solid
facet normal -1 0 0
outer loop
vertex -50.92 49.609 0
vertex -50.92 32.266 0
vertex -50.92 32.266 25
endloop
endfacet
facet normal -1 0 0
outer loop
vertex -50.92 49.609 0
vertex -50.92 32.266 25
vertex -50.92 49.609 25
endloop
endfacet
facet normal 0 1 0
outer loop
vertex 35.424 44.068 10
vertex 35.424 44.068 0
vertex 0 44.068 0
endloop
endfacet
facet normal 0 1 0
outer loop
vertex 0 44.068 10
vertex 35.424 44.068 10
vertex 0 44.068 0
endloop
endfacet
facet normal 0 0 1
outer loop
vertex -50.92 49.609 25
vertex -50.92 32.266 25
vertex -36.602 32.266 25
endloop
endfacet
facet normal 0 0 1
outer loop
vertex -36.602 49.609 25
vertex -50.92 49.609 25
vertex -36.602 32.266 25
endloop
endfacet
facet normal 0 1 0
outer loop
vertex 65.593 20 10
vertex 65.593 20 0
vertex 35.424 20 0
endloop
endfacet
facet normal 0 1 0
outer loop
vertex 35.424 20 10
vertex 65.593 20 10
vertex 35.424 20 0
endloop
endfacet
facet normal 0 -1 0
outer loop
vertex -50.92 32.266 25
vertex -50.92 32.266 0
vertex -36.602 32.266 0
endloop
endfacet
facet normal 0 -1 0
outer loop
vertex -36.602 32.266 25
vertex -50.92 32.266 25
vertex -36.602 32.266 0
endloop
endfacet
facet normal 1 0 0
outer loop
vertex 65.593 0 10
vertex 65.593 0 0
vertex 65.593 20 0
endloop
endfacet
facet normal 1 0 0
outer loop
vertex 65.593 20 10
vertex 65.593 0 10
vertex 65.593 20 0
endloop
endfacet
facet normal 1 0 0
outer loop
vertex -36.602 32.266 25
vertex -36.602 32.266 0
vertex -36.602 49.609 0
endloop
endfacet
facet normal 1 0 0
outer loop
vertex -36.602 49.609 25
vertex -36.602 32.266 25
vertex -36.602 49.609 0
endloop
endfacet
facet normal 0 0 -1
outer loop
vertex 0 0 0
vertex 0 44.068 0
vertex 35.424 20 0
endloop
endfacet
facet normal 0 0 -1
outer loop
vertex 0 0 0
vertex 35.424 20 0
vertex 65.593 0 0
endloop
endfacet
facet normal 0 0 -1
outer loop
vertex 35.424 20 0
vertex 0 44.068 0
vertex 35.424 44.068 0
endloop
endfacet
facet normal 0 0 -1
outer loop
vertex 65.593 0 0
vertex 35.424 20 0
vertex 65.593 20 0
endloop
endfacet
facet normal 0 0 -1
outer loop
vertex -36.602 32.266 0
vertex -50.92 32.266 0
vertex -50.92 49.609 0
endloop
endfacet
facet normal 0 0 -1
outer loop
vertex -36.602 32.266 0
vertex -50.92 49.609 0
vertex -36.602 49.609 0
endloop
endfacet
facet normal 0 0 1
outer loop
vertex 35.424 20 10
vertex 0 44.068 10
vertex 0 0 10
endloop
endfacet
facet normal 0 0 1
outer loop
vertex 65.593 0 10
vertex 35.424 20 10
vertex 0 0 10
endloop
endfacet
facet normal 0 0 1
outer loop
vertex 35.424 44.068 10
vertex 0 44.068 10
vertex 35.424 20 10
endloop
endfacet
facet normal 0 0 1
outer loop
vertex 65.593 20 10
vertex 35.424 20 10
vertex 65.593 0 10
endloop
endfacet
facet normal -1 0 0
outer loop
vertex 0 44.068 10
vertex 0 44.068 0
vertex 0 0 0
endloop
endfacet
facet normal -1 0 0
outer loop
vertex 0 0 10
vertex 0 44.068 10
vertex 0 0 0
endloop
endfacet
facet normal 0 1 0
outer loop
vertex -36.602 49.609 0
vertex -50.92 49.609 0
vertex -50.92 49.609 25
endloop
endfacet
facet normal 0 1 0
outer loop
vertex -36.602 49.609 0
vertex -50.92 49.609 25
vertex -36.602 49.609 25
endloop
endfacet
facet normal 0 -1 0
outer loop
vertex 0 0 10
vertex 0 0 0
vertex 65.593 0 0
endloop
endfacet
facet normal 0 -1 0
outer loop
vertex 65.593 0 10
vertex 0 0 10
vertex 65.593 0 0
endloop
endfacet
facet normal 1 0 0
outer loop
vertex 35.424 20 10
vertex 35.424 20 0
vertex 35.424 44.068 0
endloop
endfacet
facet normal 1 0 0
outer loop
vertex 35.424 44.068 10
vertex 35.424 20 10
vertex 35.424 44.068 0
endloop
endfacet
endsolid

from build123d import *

# Parameters (mm, degrees)
F2_DEPTH = 10
F3_W     = 14.3181830645
F3_H     = 17.3431523144
F4_DEPTH = 25


# Not quite as in the source:
# - a feature names something its author has since deleted; it is built from what else it names


with BuildPart() as f2:
    # F0 (on Top) → F2 (new body)
    with BuildSketch(Plane.XY):
        Polygon((0, 44.0678059284), (0, 0), (65.5932351728, 0), (65.5932351728, 20), (35.4237365217, 20), (35.4237365217, 44.0678059284), align=None)
    extrude(amount=F2_DEPTH)


with BuildPart() as f4:
    # F3 (on Top) → F4 (new body)
    with BuildSketch(Plane.XY):
        with Locations((-43.7612049282, 40.9379024059)):
            Rectangle(F3_W, F3_H)
    extrude(amount=F4_DEPTH)


solid = Compound([f2.part, f4.part])
